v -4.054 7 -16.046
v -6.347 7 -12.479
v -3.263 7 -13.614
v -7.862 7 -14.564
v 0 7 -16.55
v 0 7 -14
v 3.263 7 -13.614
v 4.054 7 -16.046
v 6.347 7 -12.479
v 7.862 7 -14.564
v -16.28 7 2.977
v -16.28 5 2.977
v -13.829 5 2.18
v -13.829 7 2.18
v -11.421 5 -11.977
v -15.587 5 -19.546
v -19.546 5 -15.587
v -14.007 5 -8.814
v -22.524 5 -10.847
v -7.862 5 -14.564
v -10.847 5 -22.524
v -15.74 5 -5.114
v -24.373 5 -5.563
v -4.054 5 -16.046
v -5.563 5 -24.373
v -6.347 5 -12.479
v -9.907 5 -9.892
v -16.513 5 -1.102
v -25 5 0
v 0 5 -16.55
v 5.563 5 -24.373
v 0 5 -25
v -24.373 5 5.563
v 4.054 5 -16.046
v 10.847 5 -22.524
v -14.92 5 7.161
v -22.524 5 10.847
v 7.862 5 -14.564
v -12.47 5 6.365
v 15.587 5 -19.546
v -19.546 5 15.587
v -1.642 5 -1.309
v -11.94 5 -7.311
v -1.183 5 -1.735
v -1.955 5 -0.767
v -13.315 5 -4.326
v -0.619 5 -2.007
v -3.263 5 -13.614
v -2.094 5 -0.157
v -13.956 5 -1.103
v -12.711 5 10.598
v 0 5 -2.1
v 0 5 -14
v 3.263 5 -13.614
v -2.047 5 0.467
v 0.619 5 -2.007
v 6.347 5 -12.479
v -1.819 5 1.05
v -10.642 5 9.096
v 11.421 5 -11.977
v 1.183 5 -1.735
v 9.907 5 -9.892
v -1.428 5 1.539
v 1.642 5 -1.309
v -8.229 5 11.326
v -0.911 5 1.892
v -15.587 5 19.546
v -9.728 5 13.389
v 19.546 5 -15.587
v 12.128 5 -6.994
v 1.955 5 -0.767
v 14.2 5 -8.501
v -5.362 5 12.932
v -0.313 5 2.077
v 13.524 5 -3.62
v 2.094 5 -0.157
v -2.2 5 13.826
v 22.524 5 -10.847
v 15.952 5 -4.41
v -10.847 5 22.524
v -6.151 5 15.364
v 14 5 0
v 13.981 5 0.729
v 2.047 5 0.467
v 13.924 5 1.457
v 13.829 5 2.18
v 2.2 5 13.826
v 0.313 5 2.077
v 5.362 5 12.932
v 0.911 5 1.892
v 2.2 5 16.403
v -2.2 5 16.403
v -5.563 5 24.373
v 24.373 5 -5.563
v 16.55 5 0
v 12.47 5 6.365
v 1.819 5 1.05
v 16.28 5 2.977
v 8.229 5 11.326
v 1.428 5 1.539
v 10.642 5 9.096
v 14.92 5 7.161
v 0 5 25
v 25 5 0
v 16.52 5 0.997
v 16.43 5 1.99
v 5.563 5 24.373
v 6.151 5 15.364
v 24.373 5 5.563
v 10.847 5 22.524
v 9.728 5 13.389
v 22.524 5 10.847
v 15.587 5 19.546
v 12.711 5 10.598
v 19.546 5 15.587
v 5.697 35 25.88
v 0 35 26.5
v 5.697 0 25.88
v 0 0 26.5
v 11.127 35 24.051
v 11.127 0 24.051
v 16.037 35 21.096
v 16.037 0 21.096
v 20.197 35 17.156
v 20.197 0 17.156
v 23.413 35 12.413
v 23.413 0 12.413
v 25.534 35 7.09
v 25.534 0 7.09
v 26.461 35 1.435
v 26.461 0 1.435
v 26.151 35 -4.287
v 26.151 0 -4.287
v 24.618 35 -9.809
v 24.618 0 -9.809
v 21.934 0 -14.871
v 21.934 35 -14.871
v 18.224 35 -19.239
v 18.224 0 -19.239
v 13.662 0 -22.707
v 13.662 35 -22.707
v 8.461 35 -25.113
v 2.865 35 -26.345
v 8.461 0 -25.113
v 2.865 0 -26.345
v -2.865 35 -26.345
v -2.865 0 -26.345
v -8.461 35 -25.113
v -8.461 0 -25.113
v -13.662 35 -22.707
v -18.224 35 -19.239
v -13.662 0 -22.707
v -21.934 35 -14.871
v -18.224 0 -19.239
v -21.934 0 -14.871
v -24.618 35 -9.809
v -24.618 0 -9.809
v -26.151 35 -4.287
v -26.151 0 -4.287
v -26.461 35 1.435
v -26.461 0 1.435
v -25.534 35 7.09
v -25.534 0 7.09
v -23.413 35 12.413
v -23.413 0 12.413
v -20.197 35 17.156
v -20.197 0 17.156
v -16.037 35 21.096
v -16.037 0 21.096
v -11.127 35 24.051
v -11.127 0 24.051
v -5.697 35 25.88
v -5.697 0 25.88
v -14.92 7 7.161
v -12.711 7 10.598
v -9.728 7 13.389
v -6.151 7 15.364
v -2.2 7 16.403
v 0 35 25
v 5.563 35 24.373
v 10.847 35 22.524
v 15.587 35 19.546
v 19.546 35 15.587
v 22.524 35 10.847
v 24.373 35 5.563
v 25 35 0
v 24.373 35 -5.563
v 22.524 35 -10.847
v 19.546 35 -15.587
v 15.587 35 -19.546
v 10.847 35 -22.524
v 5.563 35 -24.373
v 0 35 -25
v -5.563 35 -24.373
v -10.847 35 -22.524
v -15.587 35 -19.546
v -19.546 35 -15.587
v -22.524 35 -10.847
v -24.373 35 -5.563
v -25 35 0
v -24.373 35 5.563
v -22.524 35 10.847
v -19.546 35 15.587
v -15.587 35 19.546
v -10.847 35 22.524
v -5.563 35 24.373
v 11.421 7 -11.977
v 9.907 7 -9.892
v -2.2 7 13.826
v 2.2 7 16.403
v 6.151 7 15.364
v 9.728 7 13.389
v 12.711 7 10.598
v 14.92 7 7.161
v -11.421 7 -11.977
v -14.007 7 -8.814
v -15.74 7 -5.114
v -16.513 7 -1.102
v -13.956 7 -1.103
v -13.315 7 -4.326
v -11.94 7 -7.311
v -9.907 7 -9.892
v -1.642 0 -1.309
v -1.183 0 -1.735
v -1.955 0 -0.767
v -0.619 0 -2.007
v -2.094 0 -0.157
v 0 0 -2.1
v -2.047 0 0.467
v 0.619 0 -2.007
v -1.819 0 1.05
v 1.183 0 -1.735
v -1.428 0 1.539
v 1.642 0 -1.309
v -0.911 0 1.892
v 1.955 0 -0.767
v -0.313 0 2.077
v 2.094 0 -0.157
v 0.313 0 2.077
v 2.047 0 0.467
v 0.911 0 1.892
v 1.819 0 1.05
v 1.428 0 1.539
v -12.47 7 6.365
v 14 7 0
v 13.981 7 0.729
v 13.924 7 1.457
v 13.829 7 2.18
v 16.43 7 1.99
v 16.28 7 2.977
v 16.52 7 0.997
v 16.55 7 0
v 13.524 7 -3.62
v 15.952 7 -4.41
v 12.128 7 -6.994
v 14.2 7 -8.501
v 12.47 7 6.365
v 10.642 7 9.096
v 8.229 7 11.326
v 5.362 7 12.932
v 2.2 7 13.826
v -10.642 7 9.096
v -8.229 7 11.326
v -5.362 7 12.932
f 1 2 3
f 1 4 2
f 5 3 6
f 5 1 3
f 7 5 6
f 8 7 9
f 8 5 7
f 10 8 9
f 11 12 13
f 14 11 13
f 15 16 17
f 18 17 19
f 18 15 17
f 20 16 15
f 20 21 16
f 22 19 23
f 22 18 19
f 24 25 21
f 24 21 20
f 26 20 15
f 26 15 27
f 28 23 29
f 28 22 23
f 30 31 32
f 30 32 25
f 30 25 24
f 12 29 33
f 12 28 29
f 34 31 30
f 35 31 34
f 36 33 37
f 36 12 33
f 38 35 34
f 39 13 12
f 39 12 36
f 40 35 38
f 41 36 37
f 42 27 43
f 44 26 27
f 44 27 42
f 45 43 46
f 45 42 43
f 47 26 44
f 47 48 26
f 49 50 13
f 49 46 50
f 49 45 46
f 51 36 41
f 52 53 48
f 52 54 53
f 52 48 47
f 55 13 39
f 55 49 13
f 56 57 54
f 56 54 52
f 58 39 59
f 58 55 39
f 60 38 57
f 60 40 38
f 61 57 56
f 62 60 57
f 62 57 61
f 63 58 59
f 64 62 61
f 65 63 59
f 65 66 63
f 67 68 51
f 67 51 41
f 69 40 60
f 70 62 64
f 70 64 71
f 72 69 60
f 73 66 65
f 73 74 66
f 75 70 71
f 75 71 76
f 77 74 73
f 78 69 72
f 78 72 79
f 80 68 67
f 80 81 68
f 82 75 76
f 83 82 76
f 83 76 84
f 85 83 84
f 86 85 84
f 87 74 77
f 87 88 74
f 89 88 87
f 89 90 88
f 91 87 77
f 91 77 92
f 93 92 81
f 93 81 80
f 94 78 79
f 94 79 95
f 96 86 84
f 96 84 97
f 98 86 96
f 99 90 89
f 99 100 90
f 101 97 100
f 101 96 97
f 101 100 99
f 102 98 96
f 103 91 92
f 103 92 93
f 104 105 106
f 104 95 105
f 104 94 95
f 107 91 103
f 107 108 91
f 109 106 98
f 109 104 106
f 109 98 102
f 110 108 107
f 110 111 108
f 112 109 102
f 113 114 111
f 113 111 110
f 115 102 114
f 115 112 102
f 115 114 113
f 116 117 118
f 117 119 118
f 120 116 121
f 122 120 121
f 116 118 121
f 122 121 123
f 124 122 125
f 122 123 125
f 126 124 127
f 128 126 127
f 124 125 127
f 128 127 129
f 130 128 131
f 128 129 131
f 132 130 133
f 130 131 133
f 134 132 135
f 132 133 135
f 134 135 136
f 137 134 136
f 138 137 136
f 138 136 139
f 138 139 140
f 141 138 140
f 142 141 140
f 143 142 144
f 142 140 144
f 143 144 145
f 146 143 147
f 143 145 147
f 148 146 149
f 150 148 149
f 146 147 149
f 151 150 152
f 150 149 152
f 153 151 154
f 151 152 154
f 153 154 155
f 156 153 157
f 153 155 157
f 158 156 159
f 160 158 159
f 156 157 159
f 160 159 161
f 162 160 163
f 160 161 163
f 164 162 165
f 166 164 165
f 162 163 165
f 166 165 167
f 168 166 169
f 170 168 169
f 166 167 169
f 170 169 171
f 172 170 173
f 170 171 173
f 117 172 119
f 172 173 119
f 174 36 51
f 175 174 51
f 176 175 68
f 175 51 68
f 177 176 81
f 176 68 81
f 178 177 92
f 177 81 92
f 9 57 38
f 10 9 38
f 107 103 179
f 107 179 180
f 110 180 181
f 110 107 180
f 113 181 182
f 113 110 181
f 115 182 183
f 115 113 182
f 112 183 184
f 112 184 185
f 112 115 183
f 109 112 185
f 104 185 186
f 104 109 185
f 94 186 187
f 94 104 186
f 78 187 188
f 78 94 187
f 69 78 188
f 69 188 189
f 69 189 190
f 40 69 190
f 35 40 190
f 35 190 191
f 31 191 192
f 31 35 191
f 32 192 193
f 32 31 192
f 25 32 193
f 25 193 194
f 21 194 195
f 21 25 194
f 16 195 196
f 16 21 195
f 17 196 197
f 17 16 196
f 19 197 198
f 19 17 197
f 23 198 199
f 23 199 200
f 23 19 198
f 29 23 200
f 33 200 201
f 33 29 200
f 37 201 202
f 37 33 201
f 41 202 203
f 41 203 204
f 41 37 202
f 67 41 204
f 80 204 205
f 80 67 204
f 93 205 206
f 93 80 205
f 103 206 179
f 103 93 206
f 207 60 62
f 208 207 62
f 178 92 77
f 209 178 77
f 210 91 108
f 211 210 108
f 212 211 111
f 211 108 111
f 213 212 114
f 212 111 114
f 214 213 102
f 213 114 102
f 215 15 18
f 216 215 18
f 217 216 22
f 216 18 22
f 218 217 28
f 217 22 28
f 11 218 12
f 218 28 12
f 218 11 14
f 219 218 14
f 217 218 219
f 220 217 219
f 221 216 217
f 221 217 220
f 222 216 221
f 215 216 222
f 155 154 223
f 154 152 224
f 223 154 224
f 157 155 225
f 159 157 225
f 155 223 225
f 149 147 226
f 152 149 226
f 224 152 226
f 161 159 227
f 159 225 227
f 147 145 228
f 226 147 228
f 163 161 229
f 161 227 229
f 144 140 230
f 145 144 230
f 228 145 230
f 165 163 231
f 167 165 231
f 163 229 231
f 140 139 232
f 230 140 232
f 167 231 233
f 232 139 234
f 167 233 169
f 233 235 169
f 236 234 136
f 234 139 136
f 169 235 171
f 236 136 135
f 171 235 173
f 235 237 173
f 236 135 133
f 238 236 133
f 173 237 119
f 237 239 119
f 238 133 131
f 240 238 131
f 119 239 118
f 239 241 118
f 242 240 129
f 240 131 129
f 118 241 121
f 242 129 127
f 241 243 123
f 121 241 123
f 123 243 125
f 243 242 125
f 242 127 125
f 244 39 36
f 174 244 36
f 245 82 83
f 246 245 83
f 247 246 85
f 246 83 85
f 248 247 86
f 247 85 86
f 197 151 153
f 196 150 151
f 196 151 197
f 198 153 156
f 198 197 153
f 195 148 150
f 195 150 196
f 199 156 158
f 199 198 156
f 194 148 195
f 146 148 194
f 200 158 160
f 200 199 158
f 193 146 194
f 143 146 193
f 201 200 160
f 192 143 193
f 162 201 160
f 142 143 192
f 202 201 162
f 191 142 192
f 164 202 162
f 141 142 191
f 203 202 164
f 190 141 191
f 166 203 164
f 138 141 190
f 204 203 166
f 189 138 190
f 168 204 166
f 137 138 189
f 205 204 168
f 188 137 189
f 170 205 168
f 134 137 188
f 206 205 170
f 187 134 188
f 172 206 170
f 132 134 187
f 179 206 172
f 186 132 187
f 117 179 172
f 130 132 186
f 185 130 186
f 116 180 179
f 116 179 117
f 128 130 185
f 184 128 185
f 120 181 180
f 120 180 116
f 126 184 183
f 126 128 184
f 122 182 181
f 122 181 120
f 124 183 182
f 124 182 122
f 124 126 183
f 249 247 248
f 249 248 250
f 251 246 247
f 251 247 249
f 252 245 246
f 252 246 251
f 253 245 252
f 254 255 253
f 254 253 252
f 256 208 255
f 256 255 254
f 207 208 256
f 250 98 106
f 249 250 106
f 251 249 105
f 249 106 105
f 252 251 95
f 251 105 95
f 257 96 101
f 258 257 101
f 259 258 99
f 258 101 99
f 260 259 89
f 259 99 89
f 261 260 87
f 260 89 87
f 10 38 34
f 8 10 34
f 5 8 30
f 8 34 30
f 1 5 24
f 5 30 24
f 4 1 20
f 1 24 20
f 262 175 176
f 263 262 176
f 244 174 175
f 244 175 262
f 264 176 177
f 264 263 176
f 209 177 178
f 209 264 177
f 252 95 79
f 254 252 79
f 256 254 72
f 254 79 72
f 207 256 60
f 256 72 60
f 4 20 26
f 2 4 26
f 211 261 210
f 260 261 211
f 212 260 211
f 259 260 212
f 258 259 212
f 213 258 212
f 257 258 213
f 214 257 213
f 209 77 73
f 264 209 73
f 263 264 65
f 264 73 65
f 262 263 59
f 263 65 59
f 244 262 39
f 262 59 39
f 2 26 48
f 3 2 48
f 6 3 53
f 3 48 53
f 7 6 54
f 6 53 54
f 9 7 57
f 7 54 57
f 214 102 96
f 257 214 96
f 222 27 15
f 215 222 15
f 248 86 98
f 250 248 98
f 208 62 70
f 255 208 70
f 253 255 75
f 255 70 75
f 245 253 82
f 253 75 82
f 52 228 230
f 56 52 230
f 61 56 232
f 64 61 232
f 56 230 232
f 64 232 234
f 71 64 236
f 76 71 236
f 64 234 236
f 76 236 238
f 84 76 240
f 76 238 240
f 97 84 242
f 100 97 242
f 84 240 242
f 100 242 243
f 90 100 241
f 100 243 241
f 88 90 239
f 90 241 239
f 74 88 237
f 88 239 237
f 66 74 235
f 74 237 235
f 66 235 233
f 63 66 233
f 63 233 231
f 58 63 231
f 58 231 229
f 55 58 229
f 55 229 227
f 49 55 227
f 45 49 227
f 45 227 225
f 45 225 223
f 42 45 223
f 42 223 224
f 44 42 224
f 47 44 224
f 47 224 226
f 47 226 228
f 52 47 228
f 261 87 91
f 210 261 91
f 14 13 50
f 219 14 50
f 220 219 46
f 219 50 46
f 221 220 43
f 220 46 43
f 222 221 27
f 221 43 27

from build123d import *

# Parameters (mm, degrees)
SKETCH_1_R          = 26.5
EXTRUDE_1_DEPTH     = 5
SKETCH_2_R          = 26.5
SKETCH_2_R_2        = 25
EXTRUDE_2_DEPTH     = 30
SKETCH_3_R          = 2.1
CUT_EXTRUDE_1_DEPTH = 10
EXTRUDE_3_DEPTH     = 2


with BuildPart() as part:
    # 草图1 → 凸台-拉伸1 (new body)
    with BuildSketch(Plane(origin=(0, 0, 0), x_dir=(1, 0, 0), z_dir=(0, 1, 0))):
        with Locations(Location((0, 0, 0), (0, 0, 270))):
            Circle(SKETCH_1_R)
    extrude(amount=EXTRUDE_1_DEPTH)

    # 草图2 → 凸台-拉伸2 (add)
    with BuildSketch(Plane(origin=(0, 5, 0), x_dir=(1, 0, 0), z_dir=(0, 1, 0))):
        with Locations(Location((0, 0, 0), (0, 0, 270))):
            Circle(SKETCH_2_R)
        with Locations(Location((0, 0, 0), (0, 0, 270))):
            Circle(SKETCH_2_R_2, mode=Mode.SUBTRACT)
    extrude(amount=EXTRUDE_2_DEPTH)

    # 草图3 → 切除-拉伸1 (cut)
    with BuildSketch(Plane.XZ):
        with Locations(Location((0, 0, 0), (0, 0, 270))):
            Circle(SKETCH_3_R)
    extrude(amount=-CUT_EXTRUDE_1_DEPTH, mode=Mode.SUBTRACT)

    # 草图4 → 凸台-拉伸3 (add)
    with BuildSketch(Plane(origin=(0, 5, 0), x_dir=(1, 0, 0), z_dir=(0, 1, 0))):
        with BuildLine():
            ThreePointArc((-13.829204077, -2.180163894), (-13.314791228, 4.326237921), (-9.906592932, 9.892391848))
            Line((-9.906592932, 9.892391848), (-11.421352179, 11.97727909))
            ThreePointArc((-11.421352179, 11.97727909), (-15.739985345, 5.114231257), (-16.280136023, -2.976519958))
            Line((-16.280136023, -2.976519958), (-13.829204077, -2.180163894))
        make_face()
        with BuildLine():
            ThreePointArc((-6.346918157, 12.478646958), (0, 14), (6.346918157, 12.478646958))
            Line((6.346918157, 12.478646958), (7.861677404, 14.5635342))
            ThreePointArc((7.861677404, 14.5635342), (0, 16.55), (-7.861677404, 14.5635342))
            Line((-7.861677404, 14.5635342), (-6.346918157, 12.478646958))
        make_face()
        with BuildLine():
            ThreePointArc((14, 0), (13.957235705, -1.093421906), (13.829204077, -2.180163894))
            Line((13.829204077, -2.180163894), (16.280136023, -2.976519958))
            ThreePointArc((16.280136023, -2.976519958), (16.48239593, -1.494364215), (16.55, 0))
            ThreePointArc((16.55, 0), (15.213906115, 6.514565275), (11.421352179, 11.97727909))
            Line((11.421352179, 11.97727909), (9.906592932, 9.892391848))
            ThreePointArc((9.906592932, 9.892391848), (12.936234016, 5.352929056), (14, 0))
        make_face()
        with BuildLine():
            ThreePointArc((12.469529301, -6.364812566), (8.228993532, -11.326237921), (2.2, -13.826062346))
            Line((2.2, -13.826062346), (2.2, -16.403124702))
            ThreePointArc((2.2, -16.403124702), (9.727845925, -13.389231257), (14.920461248, -7.16116863))
            Line((14.920461248, -7.16116863), (12.469529301, -6.364812566))
        make_face()
        with BuildLine():
            Line((-2.2, -16.403124702), (-2.2, -13.826062346))
            ThreePointArc((-2.2, -13.826062346), (-8.228993532, -11.326237921), (-12.469529301, -6.364812566))
            Line((-12.469529301, -6.364812566), (-14.920461248, -7.16116863))
            ThreePointArc((-14.920461248, -7.16116863), (-9.727845925, -13.389231257), (-2.2, -16.403124702))
        make_face()
    extrude(amount=EXTRUDE_3_DEPTH)


solid = part.part
